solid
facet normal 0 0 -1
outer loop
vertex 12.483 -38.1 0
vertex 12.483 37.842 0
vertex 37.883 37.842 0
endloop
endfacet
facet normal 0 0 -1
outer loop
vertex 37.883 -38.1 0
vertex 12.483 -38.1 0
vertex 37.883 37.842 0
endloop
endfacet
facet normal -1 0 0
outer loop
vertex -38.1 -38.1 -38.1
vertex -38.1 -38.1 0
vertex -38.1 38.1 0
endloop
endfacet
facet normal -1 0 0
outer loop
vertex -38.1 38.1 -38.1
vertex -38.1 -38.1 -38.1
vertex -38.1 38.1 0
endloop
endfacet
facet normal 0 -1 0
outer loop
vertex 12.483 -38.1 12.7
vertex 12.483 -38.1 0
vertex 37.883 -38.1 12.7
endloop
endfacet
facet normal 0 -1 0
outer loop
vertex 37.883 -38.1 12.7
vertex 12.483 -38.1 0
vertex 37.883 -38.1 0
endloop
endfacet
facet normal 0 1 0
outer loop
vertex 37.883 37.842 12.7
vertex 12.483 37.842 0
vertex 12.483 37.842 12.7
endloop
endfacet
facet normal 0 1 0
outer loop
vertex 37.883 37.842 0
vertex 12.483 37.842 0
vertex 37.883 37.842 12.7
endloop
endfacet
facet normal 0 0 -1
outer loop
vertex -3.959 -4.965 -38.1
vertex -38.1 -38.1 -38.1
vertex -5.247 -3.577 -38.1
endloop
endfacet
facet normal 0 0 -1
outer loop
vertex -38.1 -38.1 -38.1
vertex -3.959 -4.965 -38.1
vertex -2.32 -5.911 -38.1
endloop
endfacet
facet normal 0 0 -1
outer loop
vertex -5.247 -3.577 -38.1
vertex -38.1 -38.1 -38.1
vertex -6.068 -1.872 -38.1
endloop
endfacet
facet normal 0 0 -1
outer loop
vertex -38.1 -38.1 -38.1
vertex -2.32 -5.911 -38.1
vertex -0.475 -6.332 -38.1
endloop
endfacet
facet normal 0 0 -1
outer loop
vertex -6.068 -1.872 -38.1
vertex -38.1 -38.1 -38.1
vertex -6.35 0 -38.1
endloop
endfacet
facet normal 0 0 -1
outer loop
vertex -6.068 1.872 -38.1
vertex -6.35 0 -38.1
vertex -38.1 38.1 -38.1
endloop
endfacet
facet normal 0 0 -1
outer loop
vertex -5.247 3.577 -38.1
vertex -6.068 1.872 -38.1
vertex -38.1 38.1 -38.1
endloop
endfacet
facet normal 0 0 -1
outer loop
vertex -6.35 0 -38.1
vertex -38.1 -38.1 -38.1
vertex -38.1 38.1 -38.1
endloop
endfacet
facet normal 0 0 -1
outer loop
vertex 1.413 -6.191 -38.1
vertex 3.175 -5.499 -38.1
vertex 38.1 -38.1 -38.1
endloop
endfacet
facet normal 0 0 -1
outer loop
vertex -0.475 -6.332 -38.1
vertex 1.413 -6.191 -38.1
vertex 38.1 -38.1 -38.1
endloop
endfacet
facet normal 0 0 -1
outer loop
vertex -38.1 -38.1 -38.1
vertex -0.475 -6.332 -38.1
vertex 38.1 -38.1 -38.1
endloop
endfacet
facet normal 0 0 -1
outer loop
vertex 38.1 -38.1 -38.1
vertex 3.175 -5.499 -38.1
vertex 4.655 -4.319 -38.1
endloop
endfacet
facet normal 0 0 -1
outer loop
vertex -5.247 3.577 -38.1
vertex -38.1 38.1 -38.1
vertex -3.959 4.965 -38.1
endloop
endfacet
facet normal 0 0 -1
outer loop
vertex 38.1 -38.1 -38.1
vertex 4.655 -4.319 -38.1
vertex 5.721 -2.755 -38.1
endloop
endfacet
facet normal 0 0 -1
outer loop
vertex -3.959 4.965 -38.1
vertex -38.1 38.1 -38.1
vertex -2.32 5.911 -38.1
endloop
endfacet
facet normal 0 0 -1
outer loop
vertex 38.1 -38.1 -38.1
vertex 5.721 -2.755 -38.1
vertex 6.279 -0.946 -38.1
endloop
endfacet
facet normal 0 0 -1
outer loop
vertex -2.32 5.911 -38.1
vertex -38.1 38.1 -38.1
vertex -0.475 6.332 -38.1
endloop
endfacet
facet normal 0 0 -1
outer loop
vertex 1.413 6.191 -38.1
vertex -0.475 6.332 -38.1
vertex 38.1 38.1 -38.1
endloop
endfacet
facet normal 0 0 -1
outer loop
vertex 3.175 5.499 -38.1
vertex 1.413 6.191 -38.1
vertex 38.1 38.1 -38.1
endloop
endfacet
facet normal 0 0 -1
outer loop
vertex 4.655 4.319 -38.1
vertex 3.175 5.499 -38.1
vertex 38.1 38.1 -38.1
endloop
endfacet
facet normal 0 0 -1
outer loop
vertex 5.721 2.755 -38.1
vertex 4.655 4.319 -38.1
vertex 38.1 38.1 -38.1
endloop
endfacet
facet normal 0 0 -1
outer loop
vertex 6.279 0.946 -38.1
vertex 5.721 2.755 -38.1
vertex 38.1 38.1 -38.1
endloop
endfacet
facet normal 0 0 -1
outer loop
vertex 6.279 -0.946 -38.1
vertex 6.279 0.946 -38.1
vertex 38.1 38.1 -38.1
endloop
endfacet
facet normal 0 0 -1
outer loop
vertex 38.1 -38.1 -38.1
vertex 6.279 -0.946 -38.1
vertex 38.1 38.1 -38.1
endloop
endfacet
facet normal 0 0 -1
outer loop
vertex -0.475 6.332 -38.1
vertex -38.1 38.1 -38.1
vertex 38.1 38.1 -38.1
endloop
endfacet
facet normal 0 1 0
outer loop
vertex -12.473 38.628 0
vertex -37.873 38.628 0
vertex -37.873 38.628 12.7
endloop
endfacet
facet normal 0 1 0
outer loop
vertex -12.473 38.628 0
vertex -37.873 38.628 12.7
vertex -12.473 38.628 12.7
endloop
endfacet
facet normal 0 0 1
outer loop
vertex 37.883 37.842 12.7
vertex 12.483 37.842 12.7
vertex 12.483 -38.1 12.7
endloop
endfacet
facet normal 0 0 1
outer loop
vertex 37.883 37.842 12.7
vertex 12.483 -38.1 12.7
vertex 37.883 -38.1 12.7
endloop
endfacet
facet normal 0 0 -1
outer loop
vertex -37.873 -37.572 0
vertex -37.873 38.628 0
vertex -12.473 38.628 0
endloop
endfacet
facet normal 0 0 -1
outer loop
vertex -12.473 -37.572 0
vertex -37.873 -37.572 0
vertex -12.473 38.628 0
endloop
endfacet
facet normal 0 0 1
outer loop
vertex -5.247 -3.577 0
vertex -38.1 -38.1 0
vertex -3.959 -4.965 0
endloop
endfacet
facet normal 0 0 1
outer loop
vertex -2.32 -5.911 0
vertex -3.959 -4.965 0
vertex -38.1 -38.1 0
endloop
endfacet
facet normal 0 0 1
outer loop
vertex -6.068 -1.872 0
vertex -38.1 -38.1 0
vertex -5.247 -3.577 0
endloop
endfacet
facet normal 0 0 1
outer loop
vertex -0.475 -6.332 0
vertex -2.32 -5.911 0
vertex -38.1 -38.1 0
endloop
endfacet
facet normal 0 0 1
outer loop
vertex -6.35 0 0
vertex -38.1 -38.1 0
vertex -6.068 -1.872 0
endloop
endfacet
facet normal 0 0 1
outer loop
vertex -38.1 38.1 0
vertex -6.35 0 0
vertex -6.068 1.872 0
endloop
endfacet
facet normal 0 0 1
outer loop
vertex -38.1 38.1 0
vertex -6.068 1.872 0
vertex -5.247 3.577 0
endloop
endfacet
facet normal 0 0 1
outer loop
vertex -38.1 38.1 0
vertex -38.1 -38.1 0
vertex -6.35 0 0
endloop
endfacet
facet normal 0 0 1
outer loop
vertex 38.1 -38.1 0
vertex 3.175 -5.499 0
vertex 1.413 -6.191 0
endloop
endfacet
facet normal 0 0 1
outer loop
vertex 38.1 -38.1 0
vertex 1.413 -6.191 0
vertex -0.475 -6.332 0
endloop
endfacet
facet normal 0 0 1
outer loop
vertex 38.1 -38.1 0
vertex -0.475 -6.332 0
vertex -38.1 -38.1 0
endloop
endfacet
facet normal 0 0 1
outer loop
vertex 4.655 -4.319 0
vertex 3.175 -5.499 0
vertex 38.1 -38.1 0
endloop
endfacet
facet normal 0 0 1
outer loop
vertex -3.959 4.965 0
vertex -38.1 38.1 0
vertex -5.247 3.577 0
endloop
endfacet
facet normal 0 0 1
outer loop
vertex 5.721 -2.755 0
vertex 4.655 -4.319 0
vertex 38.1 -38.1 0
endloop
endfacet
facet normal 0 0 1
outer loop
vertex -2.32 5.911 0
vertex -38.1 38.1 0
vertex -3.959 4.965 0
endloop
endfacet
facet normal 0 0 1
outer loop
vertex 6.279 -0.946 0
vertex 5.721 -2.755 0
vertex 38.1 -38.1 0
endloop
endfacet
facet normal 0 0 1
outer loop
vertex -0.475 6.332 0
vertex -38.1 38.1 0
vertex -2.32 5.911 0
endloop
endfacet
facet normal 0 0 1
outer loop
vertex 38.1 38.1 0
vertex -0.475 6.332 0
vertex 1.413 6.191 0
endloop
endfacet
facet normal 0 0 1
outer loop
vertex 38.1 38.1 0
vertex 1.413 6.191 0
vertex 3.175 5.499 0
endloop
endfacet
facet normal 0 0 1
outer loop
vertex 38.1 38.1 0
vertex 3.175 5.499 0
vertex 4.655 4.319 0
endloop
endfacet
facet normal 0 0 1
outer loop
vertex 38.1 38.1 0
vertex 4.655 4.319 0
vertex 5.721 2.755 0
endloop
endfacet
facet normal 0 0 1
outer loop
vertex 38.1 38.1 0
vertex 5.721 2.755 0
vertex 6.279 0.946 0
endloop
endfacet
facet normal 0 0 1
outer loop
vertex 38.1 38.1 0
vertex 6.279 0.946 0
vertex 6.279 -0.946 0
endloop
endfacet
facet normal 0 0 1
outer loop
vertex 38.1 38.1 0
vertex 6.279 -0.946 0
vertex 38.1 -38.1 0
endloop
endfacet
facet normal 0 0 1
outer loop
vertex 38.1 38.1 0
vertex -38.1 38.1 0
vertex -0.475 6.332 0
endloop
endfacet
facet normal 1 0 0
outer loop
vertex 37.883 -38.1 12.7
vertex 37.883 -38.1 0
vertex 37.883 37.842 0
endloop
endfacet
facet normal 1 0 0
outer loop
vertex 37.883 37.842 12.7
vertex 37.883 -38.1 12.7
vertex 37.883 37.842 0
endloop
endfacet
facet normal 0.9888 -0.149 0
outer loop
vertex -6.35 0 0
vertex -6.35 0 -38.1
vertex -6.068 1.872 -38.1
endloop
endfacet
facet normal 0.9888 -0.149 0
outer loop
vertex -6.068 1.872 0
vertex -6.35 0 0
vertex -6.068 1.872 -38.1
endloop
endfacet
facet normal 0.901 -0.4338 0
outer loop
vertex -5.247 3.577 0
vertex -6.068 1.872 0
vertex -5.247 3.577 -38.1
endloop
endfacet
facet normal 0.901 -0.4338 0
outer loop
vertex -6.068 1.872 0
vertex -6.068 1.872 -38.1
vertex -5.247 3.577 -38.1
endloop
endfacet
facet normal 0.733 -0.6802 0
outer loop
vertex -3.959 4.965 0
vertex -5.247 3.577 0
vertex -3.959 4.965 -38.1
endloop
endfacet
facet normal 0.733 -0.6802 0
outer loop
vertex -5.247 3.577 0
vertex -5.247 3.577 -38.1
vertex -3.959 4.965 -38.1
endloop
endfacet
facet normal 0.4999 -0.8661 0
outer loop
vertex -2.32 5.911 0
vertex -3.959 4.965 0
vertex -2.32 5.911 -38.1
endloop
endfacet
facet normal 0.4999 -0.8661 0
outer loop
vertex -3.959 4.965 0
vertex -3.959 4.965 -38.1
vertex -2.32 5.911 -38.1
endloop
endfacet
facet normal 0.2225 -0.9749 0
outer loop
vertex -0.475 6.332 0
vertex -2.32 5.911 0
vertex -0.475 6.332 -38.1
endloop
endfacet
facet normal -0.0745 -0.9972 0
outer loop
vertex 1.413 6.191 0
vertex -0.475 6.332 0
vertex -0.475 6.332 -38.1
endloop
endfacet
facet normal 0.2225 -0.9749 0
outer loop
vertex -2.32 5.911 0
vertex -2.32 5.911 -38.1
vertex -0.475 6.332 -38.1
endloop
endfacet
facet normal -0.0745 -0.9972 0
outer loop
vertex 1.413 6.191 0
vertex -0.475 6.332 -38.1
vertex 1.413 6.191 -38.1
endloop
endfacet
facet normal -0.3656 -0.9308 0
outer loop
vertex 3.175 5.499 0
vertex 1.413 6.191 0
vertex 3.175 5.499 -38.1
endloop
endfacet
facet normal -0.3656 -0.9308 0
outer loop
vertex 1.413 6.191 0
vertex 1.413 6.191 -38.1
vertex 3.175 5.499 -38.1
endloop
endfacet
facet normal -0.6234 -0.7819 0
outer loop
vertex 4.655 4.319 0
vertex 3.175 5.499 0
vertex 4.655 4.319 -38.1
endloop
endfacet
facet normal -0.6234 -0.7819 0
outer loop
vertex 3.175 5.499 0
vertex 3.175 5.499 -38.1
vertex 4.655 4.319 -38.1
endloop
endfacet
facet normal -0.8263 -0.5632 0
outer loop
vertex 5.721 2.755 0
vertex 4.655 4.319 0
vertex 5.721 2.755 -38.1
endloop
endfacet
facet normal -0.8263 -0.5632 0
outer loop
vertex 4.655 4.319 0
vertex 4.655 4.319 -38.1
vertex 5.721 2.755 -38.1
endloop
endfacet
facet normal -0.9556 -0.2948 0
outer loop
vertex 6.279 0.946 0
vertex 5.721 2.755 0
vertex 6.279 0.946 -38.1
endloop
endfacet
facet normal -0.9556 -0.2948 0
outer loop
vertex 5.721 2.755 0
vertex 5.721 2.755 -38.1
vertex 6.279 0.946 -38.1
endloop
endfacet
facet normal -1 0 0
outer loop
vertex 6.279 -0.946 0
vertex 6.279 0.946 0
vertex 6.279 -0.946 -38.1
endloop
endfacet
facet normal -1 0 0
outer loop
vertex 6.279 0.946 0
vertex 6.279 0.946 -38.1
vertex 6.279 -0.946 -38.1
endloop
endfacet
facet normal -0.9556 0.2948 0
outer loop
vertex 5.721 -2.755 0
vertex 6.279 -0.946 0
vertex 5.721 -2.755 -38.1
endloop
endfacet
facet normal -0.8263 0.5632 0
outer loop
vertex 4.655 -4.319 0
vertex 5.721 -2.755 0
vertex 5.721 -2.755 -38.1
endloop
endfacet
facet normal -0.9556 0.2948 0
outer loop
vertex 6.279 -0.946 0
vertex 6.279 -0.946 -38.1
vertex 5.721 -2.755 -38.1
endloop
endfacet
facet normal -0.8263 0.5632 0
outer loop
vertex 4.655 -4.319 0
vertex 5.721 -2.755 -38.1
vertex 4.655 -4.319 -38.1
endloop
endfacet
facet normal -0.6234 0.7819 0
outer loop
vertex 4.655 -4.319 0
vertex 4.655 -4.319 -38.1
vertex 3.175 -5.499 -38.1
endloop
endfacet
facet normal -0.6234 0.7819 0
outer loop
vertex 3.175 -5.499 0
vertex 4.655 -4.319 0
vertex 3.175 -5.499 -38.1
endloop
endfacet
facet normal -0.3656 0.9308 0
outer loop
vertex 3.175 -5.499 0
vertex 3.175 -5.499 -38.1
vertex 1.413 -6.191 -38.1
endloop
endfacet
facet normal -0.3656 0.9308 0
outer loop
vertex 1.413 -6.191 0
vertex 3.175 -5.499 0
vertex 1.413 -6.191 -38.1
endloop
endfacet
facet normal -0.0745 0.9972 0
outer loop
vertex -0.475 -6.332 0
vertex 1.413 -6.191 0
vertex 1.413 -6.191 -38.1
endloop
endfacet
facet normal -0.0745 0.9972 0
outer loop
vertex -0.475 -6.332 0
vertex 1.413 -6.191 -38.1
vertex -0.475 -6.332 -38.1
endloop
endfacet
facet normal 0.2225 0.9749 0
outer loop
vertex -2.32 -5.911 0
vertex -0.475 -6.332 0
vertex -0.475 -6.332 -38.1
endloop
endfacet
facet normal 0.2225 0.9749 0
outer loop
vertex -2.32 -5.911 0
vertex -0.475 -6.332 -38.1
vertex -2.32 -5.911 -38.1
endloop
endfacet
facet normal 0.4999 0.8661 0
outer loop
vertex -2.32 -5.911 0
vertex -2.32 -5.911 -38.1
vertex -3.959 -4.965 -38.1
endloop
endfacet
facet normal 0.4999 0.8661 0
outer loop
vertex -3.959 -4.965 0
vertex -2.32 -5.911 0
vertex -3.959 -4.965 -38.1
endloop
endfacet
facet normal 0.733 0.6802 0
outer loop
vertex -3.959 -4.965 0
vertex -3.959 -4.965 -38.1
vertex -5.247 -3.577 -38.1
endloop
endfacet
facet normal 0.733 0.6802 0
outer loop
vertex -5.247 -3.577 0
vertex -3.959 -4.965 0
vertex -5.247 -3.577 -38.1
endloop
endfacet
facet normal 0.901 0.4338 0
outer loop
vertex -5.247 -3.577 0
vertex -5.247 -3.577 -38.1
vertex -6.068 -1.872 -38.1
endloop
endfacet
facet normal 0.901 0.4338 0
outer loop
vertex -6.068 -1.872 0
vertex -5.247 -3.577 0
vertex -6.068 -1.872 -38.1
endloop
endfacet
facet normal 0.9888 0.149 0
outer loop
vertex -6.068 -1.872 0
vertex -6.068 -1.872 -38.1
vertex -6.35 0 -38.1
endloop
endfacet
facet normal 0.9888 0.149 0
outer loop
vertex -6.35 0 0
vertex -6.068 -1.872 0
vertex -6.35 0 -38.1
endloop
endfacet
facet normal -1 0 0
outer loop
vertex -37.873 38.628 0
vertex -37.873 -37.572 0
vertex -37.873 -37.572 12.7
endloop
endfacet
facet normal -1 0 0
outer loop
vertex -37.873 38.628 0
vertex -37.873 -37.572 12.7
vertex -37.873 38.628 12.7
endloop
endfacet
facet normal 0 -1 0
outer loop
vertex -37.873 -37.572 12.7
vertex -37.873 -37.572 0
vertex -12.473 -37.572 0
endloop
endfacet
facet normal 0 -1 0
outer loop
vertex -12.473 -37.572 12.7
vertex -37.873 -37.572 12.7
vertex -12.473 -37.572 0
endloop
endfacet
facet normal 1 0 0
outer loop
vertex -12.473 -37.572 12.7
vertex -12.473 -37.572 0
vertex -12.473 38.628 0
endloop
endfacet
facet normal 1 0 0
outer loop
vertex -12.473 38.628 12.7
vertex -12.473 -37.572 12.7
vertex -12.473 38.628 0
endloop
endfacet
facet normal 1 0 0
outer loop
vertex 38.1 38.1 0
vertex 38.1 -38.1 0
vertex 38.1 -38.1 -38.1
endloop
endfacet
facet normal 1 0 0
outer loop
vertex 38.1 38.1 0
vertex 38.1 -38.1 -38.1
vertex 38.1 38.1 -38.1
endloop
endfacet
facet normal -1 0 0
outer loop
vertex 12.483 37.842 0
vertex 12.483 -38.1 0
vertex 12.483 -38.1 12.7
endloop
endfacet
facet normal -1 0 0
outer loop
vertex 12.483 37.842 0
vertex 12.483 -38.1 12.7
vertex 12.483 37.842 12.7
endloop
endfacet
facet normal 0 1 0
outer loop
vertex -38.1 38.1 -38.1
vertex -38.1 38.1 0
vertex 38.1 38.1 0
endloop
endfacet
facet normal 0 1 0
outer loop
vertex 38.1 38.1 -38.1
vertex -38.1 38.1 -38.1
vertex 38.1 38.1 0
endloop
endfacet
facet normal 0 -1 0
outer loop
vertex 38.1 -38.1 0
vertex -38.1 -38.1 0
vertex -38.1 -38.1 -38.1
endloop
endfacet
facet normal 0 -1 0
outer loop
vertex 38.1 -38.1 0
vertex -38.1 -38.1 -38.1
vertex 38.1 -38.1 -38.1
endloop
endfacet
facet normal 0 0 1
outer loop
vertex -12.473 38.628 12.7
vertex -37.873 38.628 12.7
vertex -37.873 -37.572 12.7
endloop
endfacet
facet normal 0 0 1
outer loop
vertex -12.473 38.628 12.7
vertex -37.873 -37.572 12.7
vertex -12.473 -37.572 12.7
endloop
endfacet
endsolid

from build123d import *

# Parameters (mm, degrees)
F1_W     = 25.4
F1_H     = 75.941856
F2_DEPTH = 12.7
F3_W     = 25.4
F3_H     = 76.2
F4_DEPTH = 12.7
F0_W     = 76.2
F0_H     = 76.2
F5_DEPTH = 38.1
F7_D     = 12.7


with BuildPart() as f2:
    # F1 (on face) → F2 (new body)
    with BuildSketch(Plane.XY):
        with Locations((25.183017, -0.129072)):
            Rectangle(F1_W, F1_H)
    extrude(amount=F2_DEPTH)


with BuildPart() as f4:
    # F3 (on face) → F4 (new body)
    with BuildSketch(Plane.XY):
        with Locations((-25.172639, 0.527575)):
            Rectangle(F3_W, F3_H)
    extrude(amount=F4_DEPTH)


with BuildPart() as f5:
    # F0 (on Top) → F5 (new body)
    with BuildSketch(Plane.XY):
        Rectangle(F0_W, F0_H)
    extrude(amount=-F5_DEPTH)

    # F7 (through all)
    with Locations(Plane.XY):
        with Locations((0, 0)):
            Hole(F7_D / 2)


solid = Compound([f2.part, f4.part, f5.part])
